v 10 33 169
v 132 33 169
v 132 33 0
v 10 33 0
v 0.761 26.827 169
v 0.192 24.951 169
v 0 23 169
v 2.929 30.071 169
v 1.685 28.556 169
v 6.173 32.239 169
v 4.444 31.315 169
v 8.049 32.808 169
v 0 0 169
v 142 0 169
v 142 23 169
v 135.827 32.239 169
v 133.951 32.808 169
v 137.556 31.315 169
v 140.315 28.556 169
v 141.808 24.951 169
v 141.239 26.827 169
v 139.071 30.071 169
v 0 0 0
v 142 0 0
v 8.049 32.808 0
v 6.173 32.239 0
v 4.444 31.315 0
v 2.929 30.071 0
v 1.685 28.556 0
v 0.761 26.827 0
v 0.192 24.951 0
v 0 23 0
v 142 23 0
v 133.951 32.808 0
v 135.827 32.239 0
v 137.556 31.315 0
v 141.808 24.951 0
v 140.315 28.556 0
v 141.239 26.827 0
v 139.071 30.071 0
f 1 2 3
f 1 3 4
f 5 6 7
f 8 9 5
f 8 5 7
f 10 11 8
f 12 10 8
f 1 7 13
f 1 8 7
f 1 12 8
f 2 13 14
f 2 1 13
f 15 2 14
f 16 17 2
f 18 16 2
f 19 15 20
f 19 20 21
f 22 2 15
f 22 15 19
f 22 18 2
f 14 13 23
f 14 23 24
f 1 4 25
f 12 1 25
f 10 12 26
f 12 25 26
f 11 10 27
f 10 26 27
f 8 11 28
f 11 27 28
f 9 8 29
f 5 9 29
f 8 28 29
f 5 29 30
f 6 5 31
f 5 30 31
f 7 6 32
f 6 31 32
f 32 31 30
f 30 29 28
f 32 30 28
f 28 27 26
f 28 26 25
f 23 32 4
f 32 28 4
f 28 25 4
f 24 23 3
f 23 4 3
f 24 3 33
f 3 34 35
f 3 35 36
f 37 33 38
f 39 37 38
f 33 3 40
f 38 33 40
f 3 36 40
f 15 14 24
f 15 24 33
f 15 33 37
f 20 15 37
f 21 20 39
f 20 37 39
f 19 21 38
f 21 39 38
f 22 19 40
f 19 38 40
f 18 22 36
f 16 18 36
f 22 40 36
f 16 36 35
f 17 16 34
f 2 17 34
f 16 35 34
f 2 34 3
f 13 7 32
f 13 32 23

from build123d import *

# Parameters (mm, degrees)
EXTRUDE_1_DEPTH = 169


with BuildPart() as part:
    # 草图1 → 凸台-拉伸1 (new body)
    with BuildSketch(Plane.XY):
        with BuildLine():
            Line((0, 0), (142, 0))
            Line((142, 0), (142, 23))
            ThreePointArc((142, 23), (139.071067812, 30.071067812), (132, 33))
            Line((132, 33), (10, 33))
            ThreePointArc((10, 33), (2.928932188, 30.071067812), (0, 23))
            Line((0, 23), (0, 0))
        make_face()
    extrude(amount=EXTRUDE_1_DEPTH)


solid = part.part
